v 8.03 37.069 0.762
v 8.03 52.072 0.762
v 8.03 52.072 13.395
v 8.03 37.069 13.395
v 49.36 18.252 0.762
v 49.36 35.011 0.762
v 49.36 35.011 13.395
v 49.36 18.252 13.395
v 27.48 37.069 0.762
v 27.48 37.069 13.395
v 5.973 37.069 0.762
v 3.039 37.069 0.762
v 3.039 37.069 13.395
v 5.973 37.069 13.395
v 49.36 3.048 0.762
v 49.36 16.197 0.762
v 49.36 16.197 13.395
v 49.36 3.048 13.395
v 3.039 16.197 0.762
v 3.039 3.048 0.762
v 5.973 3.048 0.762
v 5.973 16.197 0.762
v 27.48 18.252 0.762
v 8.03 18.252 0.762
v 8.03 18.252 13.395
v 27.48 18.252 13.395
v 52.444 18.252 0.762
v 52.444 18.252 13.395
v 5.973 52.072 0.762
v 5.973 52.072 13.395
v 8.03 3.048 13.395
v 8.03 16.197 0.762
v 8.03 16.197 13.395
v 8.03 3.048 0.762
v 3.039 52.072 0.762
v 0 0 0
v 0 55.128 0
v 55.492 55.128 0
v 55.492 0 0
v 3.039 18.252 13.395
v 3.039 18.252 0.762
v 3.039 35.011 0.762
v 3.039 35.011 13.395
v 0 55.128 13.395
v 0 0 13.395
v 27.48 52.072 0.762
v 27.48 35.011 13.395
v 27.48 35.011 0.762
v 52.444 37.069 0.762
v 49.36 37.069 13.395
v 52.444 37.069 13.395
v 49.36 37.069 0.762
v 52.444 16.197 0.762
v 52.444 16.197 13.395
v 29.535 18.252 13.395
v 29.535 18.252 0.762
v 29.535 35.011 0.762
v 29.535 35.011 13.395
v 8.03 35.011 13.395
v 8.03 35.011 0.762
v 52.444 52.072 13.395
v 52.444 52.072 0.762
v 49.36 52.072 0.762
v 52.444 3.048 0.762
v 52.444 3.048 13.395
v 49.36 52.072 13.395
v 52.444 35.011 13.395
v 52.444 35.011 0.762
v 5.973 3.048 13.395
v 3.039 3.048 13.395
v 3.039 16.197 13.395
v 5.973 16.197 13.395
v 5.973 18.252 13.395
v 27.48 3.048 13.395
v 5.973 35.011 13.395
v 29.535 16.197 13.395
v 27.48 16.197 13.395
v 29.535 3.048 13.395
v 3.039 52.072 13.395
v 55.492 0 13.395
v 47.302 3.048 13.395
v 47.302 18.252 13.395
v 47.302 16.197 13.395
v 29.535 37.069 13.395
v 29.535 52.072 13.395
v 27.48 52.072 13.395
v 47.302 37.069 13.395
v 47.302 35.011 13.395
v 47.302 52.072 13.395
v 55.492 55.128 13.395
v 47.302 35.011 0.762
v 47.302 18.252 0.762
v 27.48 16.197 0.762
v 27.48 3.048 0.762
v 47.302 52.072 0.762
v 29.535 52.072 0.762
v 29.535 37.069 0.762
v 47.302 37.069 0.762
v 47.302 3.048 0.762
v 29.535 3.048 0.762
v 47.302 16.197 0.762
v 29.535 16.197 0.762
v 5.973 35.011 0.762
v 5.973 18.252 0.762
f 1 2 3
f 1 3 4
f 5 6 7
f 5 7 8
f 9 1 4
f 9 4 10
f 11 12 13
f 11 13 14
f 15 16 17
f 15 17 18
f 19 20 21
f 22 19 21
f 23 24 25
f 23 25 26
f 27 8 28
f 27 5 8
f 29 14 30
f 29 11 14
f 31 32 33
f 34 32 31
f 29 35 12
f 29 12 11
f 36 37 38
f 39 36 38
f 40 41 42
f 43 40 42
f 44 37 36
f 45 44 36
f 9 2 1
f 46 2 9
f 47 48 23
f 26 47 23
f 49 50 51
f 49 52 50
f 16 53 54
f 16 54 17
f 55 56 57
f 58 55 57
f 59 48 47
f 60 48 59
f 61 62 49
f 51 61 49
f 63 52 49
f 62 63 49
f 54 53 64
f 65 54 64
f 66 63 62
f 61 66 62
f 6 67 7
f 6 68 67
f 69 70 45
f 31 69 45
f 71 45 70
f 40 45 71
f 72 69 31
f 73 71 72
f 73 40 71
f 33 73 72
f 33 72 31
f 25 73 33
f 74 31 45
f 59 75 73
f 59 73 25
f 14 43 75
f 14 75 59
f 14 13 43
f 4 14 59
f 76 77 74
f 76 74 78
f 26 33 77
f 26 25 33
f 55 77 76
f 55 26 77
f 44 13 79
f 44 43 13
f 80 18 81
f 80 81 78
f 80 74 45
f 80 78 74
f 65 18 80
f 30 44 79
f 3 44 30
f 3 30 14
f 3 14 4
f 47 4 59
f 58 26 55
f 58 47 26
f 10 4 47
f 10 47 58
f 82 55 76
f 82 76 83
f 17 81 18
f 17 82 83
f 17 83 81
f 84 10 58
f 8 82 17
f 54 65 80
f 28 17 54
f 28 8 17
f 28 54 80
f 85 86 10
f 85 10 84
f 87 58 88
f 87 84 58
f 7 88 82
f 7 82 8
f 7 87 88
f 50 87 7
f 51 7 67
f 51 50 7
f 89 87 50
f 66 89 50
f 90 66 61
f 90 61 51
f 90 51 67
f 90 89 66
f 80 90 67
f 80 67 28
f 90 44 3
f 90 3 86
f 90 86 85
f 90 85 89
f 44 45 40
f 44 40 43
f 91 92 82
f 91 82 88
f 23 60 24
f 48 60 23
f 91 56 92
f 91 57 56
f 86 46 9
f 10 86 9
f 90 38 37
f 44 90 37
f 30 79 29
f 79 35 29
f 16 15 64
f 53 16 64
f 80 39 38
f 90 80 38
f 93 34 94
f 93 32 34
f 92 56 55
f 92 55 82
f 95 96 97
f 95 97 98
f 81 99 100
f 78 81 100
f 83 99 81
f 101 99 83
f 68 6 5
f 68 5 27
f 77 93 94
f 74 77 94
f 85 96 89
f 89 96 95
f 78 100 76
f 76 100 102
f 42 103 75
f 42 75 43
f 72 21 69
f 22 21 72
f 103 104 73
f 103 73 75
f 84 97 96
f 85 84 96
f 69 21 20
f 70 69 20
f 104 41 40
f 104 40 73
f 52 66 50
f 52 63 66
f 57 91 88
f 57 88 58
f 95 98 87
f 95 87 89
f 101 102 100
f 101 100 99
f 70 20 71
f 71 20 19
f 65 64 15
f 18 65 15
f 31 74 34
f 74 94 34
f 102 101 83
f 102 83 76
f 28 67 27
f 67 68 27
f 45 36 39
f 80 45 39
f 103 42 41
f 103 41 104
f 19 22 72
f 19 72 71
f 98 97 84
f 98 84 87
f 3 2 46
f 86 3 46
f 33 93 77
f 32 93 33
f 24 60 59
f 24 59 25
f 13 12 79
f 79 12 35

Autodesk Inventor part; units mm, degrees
ref_plane "YZ Plane" through (0, 0, 0) normal (1, 0, 0) x (0, 1, 0)
ref_plane "XZ Plane" through (0, 0, 0) normal (0, 1, 0) x (-1, 0, 0)
ref_plane "XY Plane" through (0, 0, 0) normal (0, 0, 1) x (1, 0, 0)
sketch "Sketch1" plane through (0, 0, 0) normal (0, 0, 1) x (1, 0, 0)
  line L0 (0, 0) -> (55.4917, 0)
  line L1 (55.4917, 0) -> (55.4917, 55.1277)
  line L2 (55.4917, 55.1277) -> (0, 55.1277)
  line L3 (0, 55.1277) -> (0, 0)
  dimension "d0" = 55.4917
  dimension "d1" = 55.1277
extrude "Extrusion1" add sketch "Sketch1" along normal blind 0.762
sketch "Sketch2" plane through (0, 0, 0.762) normal (0, 0, 1) x (1, 0, 0)
  line L0 (3.0388, 52.072) -> (52.4437, 52.072)
  line L1 (52.4437, 52.072) -> (52.4437, 3.048)
  line L2 (52.4437, 3.048) -> (3.0388, 3.048)
  line L3 (3.0388, 3.048) -> (3.0388, 52.072)
  line L4 (55.4917, 55.1277) -> (0, 55.1277) projected
  line L5 (55.4917, 0) -> (55.4917, 55.1277) projected
  line L6 (0, 55.1277) -> (0, 0) projected
  line L7 (0, 0) -> (55.4917, 0) projected
  dimension "d4" = 3.0557
  dimension "d5" = 3.048
  dimension "d6" = 3.0388
  dimension "d7" = 3.048
extrude "Extrusion2" add sketch "Sketch2" along normal blind 12.6333
sketch "Sketch3" plane through (0, 0, 0.762) normal (0, 0, 1) x (1, 0, 0)
  line L0 (3.0388, 3.048) -> (3.0388, 52.072) projected
  line L1 (52.4437, 3.048) -> (52.4437, 52.072) projected
  line L2 (3.0388, 18.2516) -> (52.4437, 18.2516)
  line L3 (52.4437, 18.2516) -> (52.4437, 16.1969)
  line L4 (52.4437, 16.1969) -> (3.0388, 16.1969)
  line L5 (3.0388, 16.1969) -> (3.0388, 18.2516)
  line L6 (52.4437, 3.048) -> (3.0388, 3.048) projected
  line L7 (3.0388, 37.0686) -> (52.4437, 37.0686)
  line L8 (52.4437, 37.0686) -> (52.4437, 35.0112)
  line L9 (52.4437, 35.0112) -> (3.0388, 35.0112)
  line L10 (3.0388, 35.0112) -> (3.0388, 37.0686)
  line L11 (3.0388, 52.072) -> (52.4437, 52.072) projected
  line L12 (3.0388, 3.048) -> (52.4437, 3.048) projected
  line L13 (27.4802, 3.048) -> (29.5348, 3.048)
  line L14 (29.5348, 3.048) -> (29.5348, 52.072)
  line L15 (29.5348, 52.072) -> (27.4802, 52.072)
  line L16 (27.4802, 52.072) -> (27.4802, 3.048)
  line L17 (5.9731, 52.072) -> (8.0305, 52.072)
  line L18 (8.0305, 52.072) -> (8.0305, 3.048)
  line L19 (8.0305, 3.048) -> (5.9731, 3.048)
  line L20 (5.9731, 3.048) -> (5.9731, 52.072)
  line L21 (47.3023, 52.072) -> (49.3597, 52.072)
  line L22 (49.3597, 52.072) -> (49.3597, 3.048)
  line L23 (49.3597, 3.048) -> (47.3023, 3.048)
  line L24 (47.3023, 3.048) -> (47.3023, 52.072)
  point P0 (0, 0)
  dimension "d10" = 13.1489
  dimension "d11" = 2.0547
  dimension "d12" = 15.0034
  dimension "d13" = 2.0574
  dimension "d14" = 2.0547
  dimension "d15" = 24.4414
  dimension "d16" = 2.0574
  dimension "d17" = 2.9343
  dimension "d18" = 3.084
  dimension "d19" = 2.0574
extrude "Extrusion3" add sketch "Sketch3" along normal blind 12.6333 contours L0 L2 L20 L4 | L20 L4 L18 L6 | L20 L2 L18 L4 | L0 L7 L20 L9 | L20 L9 L18 L2 | L18 L2 L16 L4 | L16 L4 L14 L6 | L20 L7 L18 L9 | L16 L2 L14 L4 | L20 L11 L18 L7 | L18 L7 L16 L9 | L16 L9 L14 L2 | L14 L2 L24 L4 | L24 L4 L22 L6 | L16 L7 L14 L9 | L24 L2 L22 L4 | L16 L11 L14 L7 | L14 L7 L24 L9 | L24 L9 L22 L2 | L22 L2 L1 L4 | L24 L7 L22 L9 | L24 L11 L22 L7 | L22 L7 L1 L9
properties part number "Toy Chassis"
